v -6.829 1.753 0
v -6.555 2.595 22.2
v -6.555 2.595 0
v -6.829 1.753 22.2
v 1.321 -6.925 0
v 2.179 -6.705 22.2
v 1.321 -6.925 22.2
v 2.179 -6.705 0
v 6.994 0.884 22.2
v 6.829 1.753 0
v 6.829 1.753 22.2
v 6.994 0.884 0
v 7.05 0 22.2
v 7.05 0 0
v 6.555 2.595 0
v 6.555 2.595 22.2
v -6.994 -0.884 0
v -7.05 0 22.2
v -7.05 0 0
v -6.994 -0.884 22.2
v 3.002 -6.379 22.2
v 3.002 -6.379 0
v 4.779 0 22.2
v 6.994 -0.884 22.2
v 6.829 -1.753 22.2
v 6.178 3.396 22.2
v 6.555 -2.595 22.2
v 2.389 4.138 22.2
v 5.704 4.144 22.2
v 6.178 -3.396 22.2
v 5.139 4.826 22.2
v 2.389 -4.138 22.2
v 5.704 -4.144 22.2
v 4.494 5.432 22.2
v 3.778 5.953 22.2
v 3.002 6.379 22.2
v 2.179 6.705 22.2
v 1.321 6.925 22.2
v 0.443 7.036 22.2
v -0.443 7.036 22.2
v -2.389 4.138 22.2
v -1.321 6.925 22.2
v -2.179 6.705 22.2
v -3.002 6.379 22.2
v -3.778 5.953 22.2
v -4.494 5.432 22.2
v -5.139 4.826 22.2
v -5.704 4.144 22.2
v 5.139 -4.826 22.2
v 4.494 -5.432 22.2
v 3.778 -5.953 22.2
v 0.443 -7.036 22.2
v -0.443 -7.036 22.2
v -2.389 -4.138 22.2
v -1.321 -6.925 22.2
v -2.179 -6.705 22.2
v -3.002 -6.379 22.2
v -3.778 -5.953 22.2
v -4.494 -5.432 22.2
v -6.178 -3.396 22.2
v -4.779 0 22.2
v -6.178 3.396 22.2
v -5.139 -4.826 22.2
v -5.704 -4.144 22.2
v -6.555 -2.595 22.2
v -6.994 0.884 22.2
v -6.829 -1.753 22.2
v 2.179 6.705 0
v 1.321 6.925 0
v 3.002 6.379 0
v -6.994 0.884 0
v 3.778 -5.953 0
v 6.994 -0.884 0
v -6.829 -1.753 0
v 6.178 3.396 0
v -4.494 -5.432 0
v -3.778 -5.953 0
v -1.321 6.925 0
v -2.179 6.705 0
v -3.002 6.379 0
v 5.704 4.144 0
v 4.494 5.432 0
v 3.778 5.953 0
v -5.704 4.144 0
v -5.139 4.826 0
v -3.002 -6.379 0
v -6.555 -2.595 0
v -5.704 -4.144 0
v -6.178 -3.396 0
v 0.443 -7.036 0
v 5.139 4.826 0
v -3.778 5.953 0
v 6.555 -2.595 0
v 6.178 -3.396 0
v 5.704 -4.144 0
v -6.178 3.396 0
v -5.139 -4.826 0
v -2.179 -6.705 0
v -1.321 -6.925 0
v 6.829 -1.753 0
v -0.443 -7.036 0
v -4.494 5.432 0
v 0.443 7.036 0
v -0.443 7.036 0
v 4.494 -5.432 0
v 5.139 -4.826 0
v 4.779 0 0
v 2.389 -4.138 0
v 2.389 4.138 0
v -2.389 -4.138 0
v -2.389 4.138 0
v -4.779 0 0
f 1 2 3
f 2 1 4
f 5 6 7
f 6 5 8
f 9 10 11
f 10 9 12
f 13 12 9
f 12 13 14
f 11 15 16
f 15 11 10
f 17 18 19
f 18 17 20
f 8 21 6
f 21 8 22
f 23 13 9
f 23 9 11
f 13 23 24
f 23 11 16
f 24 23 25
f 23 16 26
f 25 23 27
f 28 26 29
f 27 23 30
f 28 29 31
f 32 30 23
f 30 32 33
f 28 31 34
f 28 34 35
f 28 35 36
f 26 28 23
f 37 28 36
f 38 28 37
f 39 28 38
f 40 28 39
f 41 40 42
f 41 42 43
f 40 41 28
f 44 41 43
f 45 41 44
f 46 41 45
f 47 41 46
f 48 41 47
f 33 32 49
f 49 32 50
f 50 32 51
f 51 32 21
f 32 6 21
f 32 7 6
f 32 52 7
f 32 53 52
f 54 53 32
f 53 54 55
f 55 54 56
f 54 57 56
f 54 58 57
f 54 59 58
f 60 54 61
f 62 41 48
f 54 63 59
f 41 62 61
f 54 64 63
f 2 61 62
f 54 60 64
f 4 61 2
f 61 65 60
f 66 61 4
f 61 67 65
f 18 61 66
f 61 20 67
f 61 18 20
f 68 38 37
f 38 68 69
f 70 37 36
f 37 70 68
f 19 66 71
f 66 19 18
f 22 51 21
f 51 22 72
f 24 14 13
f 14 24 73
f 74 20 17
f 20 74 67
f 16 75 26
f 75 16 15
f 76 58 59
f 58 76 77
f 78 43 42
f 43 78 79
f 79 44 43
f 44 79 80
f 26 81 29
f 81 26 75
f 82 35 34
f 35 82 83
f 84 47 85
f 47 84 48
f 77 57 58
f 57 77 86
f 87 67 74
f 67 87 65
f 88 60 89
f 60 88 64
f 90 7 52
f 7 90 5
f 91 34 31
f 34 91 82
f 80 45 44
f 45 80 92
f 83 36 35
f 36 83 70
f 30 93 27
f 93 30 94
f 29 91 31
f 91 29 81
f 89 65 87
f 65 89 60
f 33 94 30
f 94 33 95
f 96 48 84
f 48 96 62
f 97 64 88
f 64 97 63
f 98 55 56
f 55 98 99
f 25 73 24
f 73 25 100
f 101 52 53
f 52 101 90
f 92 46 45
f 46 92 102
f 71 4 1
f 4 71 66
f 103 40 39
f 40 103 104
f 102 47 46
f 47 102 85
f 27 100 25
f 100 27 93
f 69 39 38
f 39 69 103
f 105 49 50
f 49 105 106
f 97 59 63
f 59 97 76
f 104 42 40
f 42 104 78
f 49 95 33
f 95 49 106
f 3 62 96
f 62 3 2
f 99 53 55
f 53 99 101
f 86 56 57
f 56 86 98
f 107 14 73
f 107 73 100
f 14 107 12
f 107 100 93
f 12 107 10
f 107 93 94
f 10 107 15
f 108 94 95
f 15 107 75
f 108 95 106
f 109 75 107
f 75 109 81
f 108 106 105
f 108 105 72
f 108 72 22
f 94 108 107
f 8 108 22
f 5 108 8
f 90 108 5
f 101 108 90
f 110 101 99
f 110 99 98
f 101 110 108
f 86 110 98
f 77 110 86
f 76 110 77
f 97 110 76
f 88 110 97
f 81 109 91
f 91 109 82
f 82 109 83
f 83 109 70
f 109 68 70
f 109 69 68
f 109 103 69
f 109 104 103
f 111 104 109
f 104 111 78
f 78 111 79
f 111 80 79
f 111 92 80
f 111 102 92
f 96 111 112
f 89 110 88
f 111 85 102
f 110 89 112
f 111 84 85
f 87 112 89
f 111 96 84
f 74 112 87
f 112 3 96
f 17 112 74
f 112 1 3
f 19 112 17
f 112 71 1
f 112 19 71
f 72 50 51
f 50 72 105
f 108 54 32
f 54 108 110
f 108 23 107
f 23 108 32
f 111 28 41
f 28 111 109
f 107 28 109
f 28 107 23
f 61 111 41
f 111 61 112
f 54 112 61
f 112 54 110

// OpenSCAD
// Yaesu SMAJ to SMA antenna adapter sleeve
// author: fiveangle@gmail.com
// date: 2016feb07
// ver: 1.0
// known issues: none.

// adjust to increase/decrease polygon count at expense of processing time (above 100 is probably useless)
$fn = 50; //

smaSize = 8;
smaSides = 6;
sleeveOuterDiamAntenna = 14.1;
sleeveOuterDiamBase = 14.1;
sleeveHeight = 22.2;
extrusionSquish = 0.14;


module sleeve(){
	cylinder(r1=sleeveOuterDiamBase/2, r2=sleeveOuterDiamAntenna/2, h=sleeveHeight);
}
module sma(d=smaSize,h=sleeveHeight){
    radius = 0.5*smaSize;
	translate([0,0,0]) cylinder(r=((radius+extrusionSquish)*1.15425), h=sleeveHeight, $fn=smaSides);
}


difference(){
	sleeve();
	sma();
}
